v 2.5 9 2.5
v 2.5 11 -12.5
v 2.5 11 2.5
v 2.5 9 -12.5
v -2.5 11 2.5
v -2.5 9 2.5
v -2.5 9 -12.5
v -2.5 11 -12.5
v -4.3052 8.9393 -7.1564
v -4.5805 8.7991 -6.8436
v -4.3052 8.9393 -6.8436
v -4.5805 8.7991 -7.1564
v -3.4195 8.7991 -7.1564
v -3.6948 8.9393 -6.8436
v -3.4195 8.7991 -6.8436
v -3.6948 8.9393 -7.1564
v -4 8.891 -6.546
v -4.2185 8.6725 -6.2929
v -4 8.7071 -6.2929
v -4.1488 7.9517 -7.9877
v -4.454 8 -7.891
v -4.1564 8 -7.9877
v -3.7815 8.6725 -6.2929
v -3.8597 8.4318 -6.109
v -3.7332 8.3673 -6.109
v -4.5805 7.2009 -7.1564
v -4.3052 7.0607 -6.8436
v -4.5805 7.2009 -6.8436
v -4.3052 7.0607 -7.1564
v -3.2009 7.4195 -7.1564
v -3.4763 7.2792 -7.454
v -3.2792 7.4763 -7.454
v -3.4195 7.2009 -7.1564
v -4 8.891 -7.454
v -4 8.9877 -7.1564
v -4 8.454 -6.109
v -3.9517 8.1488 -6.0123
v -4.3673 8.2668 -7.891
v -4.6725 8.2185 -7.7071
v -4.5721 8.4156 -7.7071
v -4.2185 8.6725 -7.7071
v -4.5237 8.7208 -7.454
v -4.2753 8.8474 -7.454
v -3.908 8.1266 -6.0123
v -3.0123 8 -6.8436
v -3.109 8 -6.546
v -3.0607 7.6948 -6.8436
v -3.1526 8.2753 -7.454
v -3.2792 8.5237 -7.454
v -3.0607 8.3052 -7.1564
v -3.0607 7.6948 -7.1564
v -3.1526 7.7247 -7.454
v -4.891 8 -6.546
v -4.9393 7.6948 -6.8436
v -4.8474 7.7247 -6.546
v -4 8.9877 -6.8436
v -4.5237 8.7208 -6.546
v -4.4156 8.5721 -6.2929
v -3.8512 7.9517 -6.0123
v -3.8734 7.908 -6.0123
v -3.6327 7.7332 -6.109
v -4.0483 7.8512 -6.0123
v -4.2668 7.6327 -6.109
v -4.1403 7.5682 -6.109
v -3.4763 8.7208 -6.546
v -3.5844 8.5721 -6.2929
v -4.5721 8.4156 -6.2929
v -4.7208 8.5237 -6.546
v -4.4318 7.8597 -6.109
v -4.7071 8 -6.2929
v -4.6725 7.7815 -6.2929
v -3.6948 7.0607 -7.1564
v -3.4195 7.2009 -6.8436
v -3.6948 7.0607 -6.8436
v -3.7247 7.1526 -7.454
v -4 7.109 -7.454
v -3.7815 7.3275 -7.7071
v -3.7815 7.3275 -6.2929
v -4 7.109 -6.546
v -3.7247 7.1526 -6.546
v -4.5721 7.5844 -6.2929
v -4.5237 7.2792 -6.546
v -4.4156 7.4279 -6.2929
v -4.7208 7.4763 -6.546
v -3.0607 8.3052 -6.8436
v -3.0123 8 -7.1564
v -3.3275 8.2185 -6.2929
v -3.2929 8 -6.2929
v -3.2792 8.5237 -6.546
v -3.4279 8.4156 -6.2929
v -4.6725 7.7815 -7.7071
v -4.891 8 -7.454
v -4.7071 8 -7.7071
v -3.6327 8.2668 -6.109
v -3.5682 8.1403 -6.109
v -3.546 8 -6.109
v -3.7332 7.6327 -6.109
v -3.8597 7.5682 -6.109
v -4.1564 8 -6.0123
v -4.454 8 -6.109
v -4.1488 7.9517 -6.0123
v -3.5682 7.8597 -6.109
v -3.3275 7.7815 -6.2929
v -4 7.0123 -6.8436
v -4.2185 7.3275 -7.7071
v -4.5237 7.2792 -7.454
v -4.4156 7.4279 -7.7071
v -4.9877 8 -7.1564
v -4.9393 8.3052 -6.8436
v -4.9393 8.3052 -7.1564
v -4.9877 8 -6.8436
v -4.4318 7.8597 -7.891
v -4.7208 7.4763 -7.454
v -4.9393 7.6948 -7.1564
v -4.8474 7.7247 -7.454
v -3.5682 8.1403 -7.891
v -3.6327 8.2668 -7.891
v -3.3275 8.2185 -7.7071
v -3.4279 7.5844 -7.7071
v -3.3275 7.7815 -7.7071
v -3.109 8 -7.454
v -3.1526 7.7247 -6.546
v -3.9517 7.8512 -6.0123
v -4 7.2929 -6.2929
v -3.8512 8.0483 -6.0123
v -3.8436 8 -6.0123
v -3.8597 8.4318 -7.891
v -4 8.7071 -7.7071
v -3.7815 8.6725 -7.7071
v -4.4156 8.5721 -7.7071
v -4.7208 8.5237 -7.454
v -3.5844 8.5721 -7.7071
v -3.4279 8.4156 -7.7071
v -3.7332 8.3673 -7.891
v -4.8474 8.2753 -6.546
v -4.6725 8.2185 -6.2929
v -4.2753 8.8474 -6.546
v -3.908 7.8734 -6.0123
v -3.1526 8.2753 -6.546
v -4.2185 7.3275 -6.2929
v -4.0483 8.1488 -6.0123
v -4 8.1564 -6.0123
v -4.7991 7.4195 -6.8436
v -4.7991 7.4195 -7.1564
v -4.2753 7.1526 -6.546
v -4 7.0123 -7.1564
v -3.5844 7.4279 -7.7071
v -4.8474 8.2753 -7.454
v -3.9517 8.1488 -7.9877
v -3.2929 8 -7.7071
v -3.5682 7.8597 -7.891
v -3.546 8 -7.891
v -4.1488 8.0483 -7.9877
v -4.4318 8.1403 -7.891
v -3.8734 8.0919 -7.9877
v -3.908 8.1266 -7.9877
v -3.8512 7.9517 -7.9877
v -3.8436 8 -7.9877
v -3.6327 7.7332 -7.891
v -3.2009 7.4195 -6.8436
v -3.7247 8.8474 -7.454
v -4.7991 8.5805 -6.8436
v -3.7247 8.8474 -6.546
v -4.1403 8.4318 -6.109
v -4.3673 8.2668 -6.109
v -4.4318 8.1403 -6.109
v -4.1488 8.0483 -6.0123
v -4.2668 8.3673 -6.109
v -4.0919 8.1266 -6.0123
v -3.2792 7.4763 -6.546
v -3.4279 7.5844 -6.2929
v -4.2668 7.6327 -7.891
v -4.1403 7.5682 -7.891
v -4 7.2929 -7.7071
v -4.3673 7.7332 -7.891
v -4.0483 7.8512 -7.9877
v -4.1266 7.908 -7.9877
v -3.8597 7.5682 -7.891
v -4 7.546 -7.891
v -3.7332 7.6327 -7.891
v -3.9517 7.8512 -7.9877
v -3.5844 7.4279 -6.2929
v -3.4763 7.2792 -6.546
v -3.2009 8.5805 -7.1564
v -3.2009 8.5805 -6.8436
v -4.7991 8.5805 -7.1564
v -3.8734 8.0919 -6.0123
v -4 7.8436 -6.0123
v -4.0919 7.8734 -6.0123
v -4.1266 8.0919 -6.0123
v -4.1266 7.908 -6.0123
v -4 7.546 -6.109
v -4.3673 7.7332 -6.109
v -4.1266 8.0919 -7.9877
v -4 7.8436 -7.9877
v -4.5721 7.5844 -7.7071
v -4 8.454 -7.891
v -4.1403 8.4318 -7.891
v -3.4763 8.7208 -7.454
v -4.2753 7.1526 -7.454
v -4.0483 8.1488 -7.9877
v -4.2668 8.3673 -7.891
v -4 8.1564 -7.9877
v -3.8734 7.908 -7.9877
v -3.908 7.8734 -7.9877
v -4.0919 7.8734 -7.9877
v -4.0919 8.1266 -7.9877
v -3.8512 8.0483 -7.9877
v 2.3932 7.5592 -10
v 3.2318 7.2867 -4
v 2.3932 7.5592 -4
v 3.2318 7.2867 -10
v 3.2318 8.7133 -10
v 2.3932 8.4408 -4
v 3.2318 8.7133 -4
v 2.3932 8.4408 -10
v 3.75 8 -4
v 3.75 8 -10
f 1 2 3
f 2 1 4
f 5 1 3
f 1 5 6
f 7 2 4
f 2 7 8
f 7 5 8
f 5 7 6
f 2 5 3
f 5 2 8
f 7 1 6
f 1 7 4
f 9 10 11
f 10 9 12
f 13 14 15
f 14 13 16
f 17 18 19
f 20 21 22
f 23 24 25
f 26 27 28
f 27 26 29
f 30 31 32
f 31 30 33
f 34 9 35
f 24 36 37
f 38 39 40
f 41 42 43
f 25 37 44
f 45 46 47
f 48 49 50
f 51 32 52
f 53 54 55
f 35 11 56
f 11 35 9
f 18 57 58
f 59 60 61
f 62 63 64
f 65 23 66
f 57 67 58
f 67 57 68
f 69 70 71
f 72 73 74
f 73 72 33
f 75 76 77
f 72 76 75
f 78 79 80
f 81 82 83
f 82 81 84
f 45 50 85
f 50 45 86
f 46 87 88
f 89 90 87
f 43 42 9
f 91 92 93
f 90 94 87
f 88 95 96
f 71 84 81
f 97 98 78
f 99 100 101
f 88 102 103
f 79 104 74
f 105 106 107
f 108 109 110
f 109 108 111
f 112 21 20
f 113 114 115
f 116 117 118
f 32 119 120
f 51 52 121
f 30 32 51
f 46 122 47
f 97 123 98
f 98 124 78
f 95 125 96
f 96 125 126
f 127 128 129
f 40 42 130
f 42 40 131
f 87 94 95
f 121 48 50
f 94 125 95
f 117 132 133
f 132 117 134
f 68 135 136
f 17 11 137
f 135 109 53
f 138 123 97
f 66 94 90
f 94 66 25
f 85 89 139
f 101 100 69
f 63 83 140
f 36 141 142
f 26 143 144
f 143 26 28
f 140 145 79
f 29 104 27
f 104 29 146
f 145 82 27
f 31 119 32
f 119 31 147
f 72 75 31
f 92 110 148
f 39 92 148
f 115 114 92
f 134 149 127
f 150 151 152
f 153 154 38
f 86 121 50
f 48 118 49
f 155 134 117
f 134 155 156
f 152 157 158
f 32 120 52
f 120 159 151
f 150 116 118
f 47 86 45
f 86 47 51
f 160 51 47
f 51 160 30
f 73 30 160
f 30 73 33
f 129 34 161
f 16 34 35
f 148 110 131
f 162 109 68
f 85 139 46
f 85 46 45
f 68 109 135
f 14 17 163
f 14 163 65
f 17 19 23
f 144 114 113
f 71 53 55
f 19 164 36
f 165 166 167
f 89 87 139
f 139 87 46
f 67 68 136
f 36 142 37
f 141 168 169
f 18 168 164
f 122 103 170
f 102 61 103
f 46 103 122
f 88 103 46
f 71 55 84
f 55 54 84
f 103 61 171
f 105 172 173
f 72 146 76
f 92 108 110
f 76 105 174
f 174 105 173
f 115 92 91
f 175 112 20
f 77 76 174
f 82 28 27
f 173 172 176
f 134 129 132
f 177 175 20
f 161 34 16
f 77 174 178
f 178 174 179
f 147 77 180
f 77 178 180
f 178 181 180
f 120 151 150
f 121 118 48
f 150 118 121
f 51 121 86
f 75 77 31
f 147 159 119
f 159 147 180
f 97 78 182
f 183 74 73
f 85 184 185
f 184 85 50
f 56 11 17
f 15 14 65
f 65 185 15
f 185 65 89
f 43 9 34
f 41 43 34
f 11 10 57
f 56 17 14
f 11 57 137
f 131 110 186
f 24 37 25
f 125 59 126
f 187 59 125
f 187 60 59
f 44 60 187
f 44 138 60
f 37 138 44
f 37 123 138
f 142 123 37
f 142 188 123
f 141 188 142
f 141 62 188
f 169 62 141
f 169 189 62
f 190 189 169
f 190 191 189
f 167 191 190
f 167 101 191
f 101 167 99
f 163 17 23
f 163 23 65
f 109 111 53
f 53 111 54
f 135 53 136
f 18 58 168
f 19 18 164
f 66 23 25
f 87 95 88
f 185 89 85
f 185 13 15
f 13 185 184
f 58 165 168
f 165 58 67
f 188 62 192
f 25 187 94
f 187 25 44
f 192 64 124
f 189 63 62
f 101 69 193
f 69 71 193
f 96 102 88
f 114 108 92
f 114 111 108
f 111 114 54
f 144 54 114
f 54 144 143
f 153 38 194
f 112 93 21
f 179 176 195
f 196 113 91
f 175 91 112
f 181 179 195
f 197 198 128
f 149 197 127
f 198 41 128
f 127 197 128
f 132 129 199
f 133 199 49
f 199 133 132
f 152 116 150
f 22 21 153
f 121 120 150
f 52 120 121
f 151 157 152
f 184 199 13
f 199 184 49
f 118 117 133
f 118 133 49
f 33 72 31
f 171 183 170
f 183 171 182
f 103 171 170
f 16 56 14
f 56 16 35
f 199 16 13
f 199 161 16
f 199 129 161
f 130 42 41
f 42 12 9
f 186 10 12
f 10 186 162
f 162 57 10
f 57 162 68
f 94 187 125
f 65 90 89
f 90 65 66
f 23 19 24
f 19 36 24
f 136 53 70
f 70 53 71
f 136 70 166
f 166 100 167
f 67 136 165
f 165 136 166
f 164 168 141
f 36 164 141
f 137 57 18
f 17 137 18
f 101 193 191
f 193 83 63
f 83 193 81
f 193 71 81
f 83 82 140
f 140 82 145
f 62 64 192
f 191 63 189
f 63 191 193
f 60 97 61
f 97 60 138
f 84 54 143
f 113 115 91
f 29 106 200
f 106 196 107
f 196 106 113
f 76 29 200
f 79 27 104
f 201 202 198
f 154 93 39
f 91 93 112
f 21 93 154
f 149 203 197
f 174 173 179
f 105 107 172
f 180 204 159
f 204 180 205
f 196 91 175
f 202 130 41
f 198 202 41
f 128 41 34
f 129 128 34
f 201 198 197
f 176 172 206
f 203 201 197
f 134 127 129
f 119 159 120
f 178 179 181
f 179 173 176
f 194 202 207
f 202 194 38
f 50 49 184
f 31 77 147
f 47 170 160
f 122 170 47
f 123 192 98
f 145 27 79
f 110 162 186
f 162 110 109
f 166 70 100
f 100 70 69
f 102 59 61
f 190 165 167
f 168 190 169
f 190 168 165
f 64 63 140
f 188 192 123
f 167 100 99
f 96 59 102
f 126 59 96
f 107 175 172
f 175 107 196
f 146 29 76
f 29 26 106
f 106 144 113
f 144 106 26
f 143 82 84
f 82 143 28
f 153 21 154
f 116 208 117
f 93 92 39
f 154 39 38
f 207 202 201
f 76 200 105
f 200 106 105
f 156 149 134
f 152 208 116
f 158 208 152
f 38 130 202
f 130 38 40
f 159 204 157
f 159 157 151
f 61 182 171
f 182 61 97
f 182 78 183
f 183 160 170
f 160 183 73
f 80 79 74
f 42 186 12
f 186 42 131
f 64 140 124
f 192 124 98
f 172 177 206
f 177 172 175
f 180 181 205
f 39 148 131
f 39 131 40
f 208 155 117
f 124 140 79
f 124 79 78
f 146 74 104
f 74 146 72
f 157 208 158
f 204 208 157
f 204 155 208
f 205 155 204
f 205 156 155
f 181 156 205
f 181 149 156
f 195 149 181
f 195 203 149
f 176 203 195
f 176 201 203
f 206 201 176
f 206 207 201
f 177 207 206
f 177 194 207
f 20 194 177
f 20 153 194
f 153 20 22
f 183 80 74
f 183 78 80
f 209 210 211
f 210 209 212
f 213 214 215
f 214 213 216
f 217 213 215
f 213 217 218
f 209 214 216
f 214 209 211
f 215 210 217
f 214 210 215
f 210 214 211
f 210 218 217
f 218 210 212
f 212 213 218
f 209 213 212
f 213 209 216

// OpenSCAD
union() {
    translate([0, 10, -5])
        cube([5, 2, 15], center=true);

    translate([-4, 8, -7])
        sphere(1, center=true, $fn=20);

    translate([3, 8, -7])
        cylinder(h=6, r=0.75, center=true);
}
